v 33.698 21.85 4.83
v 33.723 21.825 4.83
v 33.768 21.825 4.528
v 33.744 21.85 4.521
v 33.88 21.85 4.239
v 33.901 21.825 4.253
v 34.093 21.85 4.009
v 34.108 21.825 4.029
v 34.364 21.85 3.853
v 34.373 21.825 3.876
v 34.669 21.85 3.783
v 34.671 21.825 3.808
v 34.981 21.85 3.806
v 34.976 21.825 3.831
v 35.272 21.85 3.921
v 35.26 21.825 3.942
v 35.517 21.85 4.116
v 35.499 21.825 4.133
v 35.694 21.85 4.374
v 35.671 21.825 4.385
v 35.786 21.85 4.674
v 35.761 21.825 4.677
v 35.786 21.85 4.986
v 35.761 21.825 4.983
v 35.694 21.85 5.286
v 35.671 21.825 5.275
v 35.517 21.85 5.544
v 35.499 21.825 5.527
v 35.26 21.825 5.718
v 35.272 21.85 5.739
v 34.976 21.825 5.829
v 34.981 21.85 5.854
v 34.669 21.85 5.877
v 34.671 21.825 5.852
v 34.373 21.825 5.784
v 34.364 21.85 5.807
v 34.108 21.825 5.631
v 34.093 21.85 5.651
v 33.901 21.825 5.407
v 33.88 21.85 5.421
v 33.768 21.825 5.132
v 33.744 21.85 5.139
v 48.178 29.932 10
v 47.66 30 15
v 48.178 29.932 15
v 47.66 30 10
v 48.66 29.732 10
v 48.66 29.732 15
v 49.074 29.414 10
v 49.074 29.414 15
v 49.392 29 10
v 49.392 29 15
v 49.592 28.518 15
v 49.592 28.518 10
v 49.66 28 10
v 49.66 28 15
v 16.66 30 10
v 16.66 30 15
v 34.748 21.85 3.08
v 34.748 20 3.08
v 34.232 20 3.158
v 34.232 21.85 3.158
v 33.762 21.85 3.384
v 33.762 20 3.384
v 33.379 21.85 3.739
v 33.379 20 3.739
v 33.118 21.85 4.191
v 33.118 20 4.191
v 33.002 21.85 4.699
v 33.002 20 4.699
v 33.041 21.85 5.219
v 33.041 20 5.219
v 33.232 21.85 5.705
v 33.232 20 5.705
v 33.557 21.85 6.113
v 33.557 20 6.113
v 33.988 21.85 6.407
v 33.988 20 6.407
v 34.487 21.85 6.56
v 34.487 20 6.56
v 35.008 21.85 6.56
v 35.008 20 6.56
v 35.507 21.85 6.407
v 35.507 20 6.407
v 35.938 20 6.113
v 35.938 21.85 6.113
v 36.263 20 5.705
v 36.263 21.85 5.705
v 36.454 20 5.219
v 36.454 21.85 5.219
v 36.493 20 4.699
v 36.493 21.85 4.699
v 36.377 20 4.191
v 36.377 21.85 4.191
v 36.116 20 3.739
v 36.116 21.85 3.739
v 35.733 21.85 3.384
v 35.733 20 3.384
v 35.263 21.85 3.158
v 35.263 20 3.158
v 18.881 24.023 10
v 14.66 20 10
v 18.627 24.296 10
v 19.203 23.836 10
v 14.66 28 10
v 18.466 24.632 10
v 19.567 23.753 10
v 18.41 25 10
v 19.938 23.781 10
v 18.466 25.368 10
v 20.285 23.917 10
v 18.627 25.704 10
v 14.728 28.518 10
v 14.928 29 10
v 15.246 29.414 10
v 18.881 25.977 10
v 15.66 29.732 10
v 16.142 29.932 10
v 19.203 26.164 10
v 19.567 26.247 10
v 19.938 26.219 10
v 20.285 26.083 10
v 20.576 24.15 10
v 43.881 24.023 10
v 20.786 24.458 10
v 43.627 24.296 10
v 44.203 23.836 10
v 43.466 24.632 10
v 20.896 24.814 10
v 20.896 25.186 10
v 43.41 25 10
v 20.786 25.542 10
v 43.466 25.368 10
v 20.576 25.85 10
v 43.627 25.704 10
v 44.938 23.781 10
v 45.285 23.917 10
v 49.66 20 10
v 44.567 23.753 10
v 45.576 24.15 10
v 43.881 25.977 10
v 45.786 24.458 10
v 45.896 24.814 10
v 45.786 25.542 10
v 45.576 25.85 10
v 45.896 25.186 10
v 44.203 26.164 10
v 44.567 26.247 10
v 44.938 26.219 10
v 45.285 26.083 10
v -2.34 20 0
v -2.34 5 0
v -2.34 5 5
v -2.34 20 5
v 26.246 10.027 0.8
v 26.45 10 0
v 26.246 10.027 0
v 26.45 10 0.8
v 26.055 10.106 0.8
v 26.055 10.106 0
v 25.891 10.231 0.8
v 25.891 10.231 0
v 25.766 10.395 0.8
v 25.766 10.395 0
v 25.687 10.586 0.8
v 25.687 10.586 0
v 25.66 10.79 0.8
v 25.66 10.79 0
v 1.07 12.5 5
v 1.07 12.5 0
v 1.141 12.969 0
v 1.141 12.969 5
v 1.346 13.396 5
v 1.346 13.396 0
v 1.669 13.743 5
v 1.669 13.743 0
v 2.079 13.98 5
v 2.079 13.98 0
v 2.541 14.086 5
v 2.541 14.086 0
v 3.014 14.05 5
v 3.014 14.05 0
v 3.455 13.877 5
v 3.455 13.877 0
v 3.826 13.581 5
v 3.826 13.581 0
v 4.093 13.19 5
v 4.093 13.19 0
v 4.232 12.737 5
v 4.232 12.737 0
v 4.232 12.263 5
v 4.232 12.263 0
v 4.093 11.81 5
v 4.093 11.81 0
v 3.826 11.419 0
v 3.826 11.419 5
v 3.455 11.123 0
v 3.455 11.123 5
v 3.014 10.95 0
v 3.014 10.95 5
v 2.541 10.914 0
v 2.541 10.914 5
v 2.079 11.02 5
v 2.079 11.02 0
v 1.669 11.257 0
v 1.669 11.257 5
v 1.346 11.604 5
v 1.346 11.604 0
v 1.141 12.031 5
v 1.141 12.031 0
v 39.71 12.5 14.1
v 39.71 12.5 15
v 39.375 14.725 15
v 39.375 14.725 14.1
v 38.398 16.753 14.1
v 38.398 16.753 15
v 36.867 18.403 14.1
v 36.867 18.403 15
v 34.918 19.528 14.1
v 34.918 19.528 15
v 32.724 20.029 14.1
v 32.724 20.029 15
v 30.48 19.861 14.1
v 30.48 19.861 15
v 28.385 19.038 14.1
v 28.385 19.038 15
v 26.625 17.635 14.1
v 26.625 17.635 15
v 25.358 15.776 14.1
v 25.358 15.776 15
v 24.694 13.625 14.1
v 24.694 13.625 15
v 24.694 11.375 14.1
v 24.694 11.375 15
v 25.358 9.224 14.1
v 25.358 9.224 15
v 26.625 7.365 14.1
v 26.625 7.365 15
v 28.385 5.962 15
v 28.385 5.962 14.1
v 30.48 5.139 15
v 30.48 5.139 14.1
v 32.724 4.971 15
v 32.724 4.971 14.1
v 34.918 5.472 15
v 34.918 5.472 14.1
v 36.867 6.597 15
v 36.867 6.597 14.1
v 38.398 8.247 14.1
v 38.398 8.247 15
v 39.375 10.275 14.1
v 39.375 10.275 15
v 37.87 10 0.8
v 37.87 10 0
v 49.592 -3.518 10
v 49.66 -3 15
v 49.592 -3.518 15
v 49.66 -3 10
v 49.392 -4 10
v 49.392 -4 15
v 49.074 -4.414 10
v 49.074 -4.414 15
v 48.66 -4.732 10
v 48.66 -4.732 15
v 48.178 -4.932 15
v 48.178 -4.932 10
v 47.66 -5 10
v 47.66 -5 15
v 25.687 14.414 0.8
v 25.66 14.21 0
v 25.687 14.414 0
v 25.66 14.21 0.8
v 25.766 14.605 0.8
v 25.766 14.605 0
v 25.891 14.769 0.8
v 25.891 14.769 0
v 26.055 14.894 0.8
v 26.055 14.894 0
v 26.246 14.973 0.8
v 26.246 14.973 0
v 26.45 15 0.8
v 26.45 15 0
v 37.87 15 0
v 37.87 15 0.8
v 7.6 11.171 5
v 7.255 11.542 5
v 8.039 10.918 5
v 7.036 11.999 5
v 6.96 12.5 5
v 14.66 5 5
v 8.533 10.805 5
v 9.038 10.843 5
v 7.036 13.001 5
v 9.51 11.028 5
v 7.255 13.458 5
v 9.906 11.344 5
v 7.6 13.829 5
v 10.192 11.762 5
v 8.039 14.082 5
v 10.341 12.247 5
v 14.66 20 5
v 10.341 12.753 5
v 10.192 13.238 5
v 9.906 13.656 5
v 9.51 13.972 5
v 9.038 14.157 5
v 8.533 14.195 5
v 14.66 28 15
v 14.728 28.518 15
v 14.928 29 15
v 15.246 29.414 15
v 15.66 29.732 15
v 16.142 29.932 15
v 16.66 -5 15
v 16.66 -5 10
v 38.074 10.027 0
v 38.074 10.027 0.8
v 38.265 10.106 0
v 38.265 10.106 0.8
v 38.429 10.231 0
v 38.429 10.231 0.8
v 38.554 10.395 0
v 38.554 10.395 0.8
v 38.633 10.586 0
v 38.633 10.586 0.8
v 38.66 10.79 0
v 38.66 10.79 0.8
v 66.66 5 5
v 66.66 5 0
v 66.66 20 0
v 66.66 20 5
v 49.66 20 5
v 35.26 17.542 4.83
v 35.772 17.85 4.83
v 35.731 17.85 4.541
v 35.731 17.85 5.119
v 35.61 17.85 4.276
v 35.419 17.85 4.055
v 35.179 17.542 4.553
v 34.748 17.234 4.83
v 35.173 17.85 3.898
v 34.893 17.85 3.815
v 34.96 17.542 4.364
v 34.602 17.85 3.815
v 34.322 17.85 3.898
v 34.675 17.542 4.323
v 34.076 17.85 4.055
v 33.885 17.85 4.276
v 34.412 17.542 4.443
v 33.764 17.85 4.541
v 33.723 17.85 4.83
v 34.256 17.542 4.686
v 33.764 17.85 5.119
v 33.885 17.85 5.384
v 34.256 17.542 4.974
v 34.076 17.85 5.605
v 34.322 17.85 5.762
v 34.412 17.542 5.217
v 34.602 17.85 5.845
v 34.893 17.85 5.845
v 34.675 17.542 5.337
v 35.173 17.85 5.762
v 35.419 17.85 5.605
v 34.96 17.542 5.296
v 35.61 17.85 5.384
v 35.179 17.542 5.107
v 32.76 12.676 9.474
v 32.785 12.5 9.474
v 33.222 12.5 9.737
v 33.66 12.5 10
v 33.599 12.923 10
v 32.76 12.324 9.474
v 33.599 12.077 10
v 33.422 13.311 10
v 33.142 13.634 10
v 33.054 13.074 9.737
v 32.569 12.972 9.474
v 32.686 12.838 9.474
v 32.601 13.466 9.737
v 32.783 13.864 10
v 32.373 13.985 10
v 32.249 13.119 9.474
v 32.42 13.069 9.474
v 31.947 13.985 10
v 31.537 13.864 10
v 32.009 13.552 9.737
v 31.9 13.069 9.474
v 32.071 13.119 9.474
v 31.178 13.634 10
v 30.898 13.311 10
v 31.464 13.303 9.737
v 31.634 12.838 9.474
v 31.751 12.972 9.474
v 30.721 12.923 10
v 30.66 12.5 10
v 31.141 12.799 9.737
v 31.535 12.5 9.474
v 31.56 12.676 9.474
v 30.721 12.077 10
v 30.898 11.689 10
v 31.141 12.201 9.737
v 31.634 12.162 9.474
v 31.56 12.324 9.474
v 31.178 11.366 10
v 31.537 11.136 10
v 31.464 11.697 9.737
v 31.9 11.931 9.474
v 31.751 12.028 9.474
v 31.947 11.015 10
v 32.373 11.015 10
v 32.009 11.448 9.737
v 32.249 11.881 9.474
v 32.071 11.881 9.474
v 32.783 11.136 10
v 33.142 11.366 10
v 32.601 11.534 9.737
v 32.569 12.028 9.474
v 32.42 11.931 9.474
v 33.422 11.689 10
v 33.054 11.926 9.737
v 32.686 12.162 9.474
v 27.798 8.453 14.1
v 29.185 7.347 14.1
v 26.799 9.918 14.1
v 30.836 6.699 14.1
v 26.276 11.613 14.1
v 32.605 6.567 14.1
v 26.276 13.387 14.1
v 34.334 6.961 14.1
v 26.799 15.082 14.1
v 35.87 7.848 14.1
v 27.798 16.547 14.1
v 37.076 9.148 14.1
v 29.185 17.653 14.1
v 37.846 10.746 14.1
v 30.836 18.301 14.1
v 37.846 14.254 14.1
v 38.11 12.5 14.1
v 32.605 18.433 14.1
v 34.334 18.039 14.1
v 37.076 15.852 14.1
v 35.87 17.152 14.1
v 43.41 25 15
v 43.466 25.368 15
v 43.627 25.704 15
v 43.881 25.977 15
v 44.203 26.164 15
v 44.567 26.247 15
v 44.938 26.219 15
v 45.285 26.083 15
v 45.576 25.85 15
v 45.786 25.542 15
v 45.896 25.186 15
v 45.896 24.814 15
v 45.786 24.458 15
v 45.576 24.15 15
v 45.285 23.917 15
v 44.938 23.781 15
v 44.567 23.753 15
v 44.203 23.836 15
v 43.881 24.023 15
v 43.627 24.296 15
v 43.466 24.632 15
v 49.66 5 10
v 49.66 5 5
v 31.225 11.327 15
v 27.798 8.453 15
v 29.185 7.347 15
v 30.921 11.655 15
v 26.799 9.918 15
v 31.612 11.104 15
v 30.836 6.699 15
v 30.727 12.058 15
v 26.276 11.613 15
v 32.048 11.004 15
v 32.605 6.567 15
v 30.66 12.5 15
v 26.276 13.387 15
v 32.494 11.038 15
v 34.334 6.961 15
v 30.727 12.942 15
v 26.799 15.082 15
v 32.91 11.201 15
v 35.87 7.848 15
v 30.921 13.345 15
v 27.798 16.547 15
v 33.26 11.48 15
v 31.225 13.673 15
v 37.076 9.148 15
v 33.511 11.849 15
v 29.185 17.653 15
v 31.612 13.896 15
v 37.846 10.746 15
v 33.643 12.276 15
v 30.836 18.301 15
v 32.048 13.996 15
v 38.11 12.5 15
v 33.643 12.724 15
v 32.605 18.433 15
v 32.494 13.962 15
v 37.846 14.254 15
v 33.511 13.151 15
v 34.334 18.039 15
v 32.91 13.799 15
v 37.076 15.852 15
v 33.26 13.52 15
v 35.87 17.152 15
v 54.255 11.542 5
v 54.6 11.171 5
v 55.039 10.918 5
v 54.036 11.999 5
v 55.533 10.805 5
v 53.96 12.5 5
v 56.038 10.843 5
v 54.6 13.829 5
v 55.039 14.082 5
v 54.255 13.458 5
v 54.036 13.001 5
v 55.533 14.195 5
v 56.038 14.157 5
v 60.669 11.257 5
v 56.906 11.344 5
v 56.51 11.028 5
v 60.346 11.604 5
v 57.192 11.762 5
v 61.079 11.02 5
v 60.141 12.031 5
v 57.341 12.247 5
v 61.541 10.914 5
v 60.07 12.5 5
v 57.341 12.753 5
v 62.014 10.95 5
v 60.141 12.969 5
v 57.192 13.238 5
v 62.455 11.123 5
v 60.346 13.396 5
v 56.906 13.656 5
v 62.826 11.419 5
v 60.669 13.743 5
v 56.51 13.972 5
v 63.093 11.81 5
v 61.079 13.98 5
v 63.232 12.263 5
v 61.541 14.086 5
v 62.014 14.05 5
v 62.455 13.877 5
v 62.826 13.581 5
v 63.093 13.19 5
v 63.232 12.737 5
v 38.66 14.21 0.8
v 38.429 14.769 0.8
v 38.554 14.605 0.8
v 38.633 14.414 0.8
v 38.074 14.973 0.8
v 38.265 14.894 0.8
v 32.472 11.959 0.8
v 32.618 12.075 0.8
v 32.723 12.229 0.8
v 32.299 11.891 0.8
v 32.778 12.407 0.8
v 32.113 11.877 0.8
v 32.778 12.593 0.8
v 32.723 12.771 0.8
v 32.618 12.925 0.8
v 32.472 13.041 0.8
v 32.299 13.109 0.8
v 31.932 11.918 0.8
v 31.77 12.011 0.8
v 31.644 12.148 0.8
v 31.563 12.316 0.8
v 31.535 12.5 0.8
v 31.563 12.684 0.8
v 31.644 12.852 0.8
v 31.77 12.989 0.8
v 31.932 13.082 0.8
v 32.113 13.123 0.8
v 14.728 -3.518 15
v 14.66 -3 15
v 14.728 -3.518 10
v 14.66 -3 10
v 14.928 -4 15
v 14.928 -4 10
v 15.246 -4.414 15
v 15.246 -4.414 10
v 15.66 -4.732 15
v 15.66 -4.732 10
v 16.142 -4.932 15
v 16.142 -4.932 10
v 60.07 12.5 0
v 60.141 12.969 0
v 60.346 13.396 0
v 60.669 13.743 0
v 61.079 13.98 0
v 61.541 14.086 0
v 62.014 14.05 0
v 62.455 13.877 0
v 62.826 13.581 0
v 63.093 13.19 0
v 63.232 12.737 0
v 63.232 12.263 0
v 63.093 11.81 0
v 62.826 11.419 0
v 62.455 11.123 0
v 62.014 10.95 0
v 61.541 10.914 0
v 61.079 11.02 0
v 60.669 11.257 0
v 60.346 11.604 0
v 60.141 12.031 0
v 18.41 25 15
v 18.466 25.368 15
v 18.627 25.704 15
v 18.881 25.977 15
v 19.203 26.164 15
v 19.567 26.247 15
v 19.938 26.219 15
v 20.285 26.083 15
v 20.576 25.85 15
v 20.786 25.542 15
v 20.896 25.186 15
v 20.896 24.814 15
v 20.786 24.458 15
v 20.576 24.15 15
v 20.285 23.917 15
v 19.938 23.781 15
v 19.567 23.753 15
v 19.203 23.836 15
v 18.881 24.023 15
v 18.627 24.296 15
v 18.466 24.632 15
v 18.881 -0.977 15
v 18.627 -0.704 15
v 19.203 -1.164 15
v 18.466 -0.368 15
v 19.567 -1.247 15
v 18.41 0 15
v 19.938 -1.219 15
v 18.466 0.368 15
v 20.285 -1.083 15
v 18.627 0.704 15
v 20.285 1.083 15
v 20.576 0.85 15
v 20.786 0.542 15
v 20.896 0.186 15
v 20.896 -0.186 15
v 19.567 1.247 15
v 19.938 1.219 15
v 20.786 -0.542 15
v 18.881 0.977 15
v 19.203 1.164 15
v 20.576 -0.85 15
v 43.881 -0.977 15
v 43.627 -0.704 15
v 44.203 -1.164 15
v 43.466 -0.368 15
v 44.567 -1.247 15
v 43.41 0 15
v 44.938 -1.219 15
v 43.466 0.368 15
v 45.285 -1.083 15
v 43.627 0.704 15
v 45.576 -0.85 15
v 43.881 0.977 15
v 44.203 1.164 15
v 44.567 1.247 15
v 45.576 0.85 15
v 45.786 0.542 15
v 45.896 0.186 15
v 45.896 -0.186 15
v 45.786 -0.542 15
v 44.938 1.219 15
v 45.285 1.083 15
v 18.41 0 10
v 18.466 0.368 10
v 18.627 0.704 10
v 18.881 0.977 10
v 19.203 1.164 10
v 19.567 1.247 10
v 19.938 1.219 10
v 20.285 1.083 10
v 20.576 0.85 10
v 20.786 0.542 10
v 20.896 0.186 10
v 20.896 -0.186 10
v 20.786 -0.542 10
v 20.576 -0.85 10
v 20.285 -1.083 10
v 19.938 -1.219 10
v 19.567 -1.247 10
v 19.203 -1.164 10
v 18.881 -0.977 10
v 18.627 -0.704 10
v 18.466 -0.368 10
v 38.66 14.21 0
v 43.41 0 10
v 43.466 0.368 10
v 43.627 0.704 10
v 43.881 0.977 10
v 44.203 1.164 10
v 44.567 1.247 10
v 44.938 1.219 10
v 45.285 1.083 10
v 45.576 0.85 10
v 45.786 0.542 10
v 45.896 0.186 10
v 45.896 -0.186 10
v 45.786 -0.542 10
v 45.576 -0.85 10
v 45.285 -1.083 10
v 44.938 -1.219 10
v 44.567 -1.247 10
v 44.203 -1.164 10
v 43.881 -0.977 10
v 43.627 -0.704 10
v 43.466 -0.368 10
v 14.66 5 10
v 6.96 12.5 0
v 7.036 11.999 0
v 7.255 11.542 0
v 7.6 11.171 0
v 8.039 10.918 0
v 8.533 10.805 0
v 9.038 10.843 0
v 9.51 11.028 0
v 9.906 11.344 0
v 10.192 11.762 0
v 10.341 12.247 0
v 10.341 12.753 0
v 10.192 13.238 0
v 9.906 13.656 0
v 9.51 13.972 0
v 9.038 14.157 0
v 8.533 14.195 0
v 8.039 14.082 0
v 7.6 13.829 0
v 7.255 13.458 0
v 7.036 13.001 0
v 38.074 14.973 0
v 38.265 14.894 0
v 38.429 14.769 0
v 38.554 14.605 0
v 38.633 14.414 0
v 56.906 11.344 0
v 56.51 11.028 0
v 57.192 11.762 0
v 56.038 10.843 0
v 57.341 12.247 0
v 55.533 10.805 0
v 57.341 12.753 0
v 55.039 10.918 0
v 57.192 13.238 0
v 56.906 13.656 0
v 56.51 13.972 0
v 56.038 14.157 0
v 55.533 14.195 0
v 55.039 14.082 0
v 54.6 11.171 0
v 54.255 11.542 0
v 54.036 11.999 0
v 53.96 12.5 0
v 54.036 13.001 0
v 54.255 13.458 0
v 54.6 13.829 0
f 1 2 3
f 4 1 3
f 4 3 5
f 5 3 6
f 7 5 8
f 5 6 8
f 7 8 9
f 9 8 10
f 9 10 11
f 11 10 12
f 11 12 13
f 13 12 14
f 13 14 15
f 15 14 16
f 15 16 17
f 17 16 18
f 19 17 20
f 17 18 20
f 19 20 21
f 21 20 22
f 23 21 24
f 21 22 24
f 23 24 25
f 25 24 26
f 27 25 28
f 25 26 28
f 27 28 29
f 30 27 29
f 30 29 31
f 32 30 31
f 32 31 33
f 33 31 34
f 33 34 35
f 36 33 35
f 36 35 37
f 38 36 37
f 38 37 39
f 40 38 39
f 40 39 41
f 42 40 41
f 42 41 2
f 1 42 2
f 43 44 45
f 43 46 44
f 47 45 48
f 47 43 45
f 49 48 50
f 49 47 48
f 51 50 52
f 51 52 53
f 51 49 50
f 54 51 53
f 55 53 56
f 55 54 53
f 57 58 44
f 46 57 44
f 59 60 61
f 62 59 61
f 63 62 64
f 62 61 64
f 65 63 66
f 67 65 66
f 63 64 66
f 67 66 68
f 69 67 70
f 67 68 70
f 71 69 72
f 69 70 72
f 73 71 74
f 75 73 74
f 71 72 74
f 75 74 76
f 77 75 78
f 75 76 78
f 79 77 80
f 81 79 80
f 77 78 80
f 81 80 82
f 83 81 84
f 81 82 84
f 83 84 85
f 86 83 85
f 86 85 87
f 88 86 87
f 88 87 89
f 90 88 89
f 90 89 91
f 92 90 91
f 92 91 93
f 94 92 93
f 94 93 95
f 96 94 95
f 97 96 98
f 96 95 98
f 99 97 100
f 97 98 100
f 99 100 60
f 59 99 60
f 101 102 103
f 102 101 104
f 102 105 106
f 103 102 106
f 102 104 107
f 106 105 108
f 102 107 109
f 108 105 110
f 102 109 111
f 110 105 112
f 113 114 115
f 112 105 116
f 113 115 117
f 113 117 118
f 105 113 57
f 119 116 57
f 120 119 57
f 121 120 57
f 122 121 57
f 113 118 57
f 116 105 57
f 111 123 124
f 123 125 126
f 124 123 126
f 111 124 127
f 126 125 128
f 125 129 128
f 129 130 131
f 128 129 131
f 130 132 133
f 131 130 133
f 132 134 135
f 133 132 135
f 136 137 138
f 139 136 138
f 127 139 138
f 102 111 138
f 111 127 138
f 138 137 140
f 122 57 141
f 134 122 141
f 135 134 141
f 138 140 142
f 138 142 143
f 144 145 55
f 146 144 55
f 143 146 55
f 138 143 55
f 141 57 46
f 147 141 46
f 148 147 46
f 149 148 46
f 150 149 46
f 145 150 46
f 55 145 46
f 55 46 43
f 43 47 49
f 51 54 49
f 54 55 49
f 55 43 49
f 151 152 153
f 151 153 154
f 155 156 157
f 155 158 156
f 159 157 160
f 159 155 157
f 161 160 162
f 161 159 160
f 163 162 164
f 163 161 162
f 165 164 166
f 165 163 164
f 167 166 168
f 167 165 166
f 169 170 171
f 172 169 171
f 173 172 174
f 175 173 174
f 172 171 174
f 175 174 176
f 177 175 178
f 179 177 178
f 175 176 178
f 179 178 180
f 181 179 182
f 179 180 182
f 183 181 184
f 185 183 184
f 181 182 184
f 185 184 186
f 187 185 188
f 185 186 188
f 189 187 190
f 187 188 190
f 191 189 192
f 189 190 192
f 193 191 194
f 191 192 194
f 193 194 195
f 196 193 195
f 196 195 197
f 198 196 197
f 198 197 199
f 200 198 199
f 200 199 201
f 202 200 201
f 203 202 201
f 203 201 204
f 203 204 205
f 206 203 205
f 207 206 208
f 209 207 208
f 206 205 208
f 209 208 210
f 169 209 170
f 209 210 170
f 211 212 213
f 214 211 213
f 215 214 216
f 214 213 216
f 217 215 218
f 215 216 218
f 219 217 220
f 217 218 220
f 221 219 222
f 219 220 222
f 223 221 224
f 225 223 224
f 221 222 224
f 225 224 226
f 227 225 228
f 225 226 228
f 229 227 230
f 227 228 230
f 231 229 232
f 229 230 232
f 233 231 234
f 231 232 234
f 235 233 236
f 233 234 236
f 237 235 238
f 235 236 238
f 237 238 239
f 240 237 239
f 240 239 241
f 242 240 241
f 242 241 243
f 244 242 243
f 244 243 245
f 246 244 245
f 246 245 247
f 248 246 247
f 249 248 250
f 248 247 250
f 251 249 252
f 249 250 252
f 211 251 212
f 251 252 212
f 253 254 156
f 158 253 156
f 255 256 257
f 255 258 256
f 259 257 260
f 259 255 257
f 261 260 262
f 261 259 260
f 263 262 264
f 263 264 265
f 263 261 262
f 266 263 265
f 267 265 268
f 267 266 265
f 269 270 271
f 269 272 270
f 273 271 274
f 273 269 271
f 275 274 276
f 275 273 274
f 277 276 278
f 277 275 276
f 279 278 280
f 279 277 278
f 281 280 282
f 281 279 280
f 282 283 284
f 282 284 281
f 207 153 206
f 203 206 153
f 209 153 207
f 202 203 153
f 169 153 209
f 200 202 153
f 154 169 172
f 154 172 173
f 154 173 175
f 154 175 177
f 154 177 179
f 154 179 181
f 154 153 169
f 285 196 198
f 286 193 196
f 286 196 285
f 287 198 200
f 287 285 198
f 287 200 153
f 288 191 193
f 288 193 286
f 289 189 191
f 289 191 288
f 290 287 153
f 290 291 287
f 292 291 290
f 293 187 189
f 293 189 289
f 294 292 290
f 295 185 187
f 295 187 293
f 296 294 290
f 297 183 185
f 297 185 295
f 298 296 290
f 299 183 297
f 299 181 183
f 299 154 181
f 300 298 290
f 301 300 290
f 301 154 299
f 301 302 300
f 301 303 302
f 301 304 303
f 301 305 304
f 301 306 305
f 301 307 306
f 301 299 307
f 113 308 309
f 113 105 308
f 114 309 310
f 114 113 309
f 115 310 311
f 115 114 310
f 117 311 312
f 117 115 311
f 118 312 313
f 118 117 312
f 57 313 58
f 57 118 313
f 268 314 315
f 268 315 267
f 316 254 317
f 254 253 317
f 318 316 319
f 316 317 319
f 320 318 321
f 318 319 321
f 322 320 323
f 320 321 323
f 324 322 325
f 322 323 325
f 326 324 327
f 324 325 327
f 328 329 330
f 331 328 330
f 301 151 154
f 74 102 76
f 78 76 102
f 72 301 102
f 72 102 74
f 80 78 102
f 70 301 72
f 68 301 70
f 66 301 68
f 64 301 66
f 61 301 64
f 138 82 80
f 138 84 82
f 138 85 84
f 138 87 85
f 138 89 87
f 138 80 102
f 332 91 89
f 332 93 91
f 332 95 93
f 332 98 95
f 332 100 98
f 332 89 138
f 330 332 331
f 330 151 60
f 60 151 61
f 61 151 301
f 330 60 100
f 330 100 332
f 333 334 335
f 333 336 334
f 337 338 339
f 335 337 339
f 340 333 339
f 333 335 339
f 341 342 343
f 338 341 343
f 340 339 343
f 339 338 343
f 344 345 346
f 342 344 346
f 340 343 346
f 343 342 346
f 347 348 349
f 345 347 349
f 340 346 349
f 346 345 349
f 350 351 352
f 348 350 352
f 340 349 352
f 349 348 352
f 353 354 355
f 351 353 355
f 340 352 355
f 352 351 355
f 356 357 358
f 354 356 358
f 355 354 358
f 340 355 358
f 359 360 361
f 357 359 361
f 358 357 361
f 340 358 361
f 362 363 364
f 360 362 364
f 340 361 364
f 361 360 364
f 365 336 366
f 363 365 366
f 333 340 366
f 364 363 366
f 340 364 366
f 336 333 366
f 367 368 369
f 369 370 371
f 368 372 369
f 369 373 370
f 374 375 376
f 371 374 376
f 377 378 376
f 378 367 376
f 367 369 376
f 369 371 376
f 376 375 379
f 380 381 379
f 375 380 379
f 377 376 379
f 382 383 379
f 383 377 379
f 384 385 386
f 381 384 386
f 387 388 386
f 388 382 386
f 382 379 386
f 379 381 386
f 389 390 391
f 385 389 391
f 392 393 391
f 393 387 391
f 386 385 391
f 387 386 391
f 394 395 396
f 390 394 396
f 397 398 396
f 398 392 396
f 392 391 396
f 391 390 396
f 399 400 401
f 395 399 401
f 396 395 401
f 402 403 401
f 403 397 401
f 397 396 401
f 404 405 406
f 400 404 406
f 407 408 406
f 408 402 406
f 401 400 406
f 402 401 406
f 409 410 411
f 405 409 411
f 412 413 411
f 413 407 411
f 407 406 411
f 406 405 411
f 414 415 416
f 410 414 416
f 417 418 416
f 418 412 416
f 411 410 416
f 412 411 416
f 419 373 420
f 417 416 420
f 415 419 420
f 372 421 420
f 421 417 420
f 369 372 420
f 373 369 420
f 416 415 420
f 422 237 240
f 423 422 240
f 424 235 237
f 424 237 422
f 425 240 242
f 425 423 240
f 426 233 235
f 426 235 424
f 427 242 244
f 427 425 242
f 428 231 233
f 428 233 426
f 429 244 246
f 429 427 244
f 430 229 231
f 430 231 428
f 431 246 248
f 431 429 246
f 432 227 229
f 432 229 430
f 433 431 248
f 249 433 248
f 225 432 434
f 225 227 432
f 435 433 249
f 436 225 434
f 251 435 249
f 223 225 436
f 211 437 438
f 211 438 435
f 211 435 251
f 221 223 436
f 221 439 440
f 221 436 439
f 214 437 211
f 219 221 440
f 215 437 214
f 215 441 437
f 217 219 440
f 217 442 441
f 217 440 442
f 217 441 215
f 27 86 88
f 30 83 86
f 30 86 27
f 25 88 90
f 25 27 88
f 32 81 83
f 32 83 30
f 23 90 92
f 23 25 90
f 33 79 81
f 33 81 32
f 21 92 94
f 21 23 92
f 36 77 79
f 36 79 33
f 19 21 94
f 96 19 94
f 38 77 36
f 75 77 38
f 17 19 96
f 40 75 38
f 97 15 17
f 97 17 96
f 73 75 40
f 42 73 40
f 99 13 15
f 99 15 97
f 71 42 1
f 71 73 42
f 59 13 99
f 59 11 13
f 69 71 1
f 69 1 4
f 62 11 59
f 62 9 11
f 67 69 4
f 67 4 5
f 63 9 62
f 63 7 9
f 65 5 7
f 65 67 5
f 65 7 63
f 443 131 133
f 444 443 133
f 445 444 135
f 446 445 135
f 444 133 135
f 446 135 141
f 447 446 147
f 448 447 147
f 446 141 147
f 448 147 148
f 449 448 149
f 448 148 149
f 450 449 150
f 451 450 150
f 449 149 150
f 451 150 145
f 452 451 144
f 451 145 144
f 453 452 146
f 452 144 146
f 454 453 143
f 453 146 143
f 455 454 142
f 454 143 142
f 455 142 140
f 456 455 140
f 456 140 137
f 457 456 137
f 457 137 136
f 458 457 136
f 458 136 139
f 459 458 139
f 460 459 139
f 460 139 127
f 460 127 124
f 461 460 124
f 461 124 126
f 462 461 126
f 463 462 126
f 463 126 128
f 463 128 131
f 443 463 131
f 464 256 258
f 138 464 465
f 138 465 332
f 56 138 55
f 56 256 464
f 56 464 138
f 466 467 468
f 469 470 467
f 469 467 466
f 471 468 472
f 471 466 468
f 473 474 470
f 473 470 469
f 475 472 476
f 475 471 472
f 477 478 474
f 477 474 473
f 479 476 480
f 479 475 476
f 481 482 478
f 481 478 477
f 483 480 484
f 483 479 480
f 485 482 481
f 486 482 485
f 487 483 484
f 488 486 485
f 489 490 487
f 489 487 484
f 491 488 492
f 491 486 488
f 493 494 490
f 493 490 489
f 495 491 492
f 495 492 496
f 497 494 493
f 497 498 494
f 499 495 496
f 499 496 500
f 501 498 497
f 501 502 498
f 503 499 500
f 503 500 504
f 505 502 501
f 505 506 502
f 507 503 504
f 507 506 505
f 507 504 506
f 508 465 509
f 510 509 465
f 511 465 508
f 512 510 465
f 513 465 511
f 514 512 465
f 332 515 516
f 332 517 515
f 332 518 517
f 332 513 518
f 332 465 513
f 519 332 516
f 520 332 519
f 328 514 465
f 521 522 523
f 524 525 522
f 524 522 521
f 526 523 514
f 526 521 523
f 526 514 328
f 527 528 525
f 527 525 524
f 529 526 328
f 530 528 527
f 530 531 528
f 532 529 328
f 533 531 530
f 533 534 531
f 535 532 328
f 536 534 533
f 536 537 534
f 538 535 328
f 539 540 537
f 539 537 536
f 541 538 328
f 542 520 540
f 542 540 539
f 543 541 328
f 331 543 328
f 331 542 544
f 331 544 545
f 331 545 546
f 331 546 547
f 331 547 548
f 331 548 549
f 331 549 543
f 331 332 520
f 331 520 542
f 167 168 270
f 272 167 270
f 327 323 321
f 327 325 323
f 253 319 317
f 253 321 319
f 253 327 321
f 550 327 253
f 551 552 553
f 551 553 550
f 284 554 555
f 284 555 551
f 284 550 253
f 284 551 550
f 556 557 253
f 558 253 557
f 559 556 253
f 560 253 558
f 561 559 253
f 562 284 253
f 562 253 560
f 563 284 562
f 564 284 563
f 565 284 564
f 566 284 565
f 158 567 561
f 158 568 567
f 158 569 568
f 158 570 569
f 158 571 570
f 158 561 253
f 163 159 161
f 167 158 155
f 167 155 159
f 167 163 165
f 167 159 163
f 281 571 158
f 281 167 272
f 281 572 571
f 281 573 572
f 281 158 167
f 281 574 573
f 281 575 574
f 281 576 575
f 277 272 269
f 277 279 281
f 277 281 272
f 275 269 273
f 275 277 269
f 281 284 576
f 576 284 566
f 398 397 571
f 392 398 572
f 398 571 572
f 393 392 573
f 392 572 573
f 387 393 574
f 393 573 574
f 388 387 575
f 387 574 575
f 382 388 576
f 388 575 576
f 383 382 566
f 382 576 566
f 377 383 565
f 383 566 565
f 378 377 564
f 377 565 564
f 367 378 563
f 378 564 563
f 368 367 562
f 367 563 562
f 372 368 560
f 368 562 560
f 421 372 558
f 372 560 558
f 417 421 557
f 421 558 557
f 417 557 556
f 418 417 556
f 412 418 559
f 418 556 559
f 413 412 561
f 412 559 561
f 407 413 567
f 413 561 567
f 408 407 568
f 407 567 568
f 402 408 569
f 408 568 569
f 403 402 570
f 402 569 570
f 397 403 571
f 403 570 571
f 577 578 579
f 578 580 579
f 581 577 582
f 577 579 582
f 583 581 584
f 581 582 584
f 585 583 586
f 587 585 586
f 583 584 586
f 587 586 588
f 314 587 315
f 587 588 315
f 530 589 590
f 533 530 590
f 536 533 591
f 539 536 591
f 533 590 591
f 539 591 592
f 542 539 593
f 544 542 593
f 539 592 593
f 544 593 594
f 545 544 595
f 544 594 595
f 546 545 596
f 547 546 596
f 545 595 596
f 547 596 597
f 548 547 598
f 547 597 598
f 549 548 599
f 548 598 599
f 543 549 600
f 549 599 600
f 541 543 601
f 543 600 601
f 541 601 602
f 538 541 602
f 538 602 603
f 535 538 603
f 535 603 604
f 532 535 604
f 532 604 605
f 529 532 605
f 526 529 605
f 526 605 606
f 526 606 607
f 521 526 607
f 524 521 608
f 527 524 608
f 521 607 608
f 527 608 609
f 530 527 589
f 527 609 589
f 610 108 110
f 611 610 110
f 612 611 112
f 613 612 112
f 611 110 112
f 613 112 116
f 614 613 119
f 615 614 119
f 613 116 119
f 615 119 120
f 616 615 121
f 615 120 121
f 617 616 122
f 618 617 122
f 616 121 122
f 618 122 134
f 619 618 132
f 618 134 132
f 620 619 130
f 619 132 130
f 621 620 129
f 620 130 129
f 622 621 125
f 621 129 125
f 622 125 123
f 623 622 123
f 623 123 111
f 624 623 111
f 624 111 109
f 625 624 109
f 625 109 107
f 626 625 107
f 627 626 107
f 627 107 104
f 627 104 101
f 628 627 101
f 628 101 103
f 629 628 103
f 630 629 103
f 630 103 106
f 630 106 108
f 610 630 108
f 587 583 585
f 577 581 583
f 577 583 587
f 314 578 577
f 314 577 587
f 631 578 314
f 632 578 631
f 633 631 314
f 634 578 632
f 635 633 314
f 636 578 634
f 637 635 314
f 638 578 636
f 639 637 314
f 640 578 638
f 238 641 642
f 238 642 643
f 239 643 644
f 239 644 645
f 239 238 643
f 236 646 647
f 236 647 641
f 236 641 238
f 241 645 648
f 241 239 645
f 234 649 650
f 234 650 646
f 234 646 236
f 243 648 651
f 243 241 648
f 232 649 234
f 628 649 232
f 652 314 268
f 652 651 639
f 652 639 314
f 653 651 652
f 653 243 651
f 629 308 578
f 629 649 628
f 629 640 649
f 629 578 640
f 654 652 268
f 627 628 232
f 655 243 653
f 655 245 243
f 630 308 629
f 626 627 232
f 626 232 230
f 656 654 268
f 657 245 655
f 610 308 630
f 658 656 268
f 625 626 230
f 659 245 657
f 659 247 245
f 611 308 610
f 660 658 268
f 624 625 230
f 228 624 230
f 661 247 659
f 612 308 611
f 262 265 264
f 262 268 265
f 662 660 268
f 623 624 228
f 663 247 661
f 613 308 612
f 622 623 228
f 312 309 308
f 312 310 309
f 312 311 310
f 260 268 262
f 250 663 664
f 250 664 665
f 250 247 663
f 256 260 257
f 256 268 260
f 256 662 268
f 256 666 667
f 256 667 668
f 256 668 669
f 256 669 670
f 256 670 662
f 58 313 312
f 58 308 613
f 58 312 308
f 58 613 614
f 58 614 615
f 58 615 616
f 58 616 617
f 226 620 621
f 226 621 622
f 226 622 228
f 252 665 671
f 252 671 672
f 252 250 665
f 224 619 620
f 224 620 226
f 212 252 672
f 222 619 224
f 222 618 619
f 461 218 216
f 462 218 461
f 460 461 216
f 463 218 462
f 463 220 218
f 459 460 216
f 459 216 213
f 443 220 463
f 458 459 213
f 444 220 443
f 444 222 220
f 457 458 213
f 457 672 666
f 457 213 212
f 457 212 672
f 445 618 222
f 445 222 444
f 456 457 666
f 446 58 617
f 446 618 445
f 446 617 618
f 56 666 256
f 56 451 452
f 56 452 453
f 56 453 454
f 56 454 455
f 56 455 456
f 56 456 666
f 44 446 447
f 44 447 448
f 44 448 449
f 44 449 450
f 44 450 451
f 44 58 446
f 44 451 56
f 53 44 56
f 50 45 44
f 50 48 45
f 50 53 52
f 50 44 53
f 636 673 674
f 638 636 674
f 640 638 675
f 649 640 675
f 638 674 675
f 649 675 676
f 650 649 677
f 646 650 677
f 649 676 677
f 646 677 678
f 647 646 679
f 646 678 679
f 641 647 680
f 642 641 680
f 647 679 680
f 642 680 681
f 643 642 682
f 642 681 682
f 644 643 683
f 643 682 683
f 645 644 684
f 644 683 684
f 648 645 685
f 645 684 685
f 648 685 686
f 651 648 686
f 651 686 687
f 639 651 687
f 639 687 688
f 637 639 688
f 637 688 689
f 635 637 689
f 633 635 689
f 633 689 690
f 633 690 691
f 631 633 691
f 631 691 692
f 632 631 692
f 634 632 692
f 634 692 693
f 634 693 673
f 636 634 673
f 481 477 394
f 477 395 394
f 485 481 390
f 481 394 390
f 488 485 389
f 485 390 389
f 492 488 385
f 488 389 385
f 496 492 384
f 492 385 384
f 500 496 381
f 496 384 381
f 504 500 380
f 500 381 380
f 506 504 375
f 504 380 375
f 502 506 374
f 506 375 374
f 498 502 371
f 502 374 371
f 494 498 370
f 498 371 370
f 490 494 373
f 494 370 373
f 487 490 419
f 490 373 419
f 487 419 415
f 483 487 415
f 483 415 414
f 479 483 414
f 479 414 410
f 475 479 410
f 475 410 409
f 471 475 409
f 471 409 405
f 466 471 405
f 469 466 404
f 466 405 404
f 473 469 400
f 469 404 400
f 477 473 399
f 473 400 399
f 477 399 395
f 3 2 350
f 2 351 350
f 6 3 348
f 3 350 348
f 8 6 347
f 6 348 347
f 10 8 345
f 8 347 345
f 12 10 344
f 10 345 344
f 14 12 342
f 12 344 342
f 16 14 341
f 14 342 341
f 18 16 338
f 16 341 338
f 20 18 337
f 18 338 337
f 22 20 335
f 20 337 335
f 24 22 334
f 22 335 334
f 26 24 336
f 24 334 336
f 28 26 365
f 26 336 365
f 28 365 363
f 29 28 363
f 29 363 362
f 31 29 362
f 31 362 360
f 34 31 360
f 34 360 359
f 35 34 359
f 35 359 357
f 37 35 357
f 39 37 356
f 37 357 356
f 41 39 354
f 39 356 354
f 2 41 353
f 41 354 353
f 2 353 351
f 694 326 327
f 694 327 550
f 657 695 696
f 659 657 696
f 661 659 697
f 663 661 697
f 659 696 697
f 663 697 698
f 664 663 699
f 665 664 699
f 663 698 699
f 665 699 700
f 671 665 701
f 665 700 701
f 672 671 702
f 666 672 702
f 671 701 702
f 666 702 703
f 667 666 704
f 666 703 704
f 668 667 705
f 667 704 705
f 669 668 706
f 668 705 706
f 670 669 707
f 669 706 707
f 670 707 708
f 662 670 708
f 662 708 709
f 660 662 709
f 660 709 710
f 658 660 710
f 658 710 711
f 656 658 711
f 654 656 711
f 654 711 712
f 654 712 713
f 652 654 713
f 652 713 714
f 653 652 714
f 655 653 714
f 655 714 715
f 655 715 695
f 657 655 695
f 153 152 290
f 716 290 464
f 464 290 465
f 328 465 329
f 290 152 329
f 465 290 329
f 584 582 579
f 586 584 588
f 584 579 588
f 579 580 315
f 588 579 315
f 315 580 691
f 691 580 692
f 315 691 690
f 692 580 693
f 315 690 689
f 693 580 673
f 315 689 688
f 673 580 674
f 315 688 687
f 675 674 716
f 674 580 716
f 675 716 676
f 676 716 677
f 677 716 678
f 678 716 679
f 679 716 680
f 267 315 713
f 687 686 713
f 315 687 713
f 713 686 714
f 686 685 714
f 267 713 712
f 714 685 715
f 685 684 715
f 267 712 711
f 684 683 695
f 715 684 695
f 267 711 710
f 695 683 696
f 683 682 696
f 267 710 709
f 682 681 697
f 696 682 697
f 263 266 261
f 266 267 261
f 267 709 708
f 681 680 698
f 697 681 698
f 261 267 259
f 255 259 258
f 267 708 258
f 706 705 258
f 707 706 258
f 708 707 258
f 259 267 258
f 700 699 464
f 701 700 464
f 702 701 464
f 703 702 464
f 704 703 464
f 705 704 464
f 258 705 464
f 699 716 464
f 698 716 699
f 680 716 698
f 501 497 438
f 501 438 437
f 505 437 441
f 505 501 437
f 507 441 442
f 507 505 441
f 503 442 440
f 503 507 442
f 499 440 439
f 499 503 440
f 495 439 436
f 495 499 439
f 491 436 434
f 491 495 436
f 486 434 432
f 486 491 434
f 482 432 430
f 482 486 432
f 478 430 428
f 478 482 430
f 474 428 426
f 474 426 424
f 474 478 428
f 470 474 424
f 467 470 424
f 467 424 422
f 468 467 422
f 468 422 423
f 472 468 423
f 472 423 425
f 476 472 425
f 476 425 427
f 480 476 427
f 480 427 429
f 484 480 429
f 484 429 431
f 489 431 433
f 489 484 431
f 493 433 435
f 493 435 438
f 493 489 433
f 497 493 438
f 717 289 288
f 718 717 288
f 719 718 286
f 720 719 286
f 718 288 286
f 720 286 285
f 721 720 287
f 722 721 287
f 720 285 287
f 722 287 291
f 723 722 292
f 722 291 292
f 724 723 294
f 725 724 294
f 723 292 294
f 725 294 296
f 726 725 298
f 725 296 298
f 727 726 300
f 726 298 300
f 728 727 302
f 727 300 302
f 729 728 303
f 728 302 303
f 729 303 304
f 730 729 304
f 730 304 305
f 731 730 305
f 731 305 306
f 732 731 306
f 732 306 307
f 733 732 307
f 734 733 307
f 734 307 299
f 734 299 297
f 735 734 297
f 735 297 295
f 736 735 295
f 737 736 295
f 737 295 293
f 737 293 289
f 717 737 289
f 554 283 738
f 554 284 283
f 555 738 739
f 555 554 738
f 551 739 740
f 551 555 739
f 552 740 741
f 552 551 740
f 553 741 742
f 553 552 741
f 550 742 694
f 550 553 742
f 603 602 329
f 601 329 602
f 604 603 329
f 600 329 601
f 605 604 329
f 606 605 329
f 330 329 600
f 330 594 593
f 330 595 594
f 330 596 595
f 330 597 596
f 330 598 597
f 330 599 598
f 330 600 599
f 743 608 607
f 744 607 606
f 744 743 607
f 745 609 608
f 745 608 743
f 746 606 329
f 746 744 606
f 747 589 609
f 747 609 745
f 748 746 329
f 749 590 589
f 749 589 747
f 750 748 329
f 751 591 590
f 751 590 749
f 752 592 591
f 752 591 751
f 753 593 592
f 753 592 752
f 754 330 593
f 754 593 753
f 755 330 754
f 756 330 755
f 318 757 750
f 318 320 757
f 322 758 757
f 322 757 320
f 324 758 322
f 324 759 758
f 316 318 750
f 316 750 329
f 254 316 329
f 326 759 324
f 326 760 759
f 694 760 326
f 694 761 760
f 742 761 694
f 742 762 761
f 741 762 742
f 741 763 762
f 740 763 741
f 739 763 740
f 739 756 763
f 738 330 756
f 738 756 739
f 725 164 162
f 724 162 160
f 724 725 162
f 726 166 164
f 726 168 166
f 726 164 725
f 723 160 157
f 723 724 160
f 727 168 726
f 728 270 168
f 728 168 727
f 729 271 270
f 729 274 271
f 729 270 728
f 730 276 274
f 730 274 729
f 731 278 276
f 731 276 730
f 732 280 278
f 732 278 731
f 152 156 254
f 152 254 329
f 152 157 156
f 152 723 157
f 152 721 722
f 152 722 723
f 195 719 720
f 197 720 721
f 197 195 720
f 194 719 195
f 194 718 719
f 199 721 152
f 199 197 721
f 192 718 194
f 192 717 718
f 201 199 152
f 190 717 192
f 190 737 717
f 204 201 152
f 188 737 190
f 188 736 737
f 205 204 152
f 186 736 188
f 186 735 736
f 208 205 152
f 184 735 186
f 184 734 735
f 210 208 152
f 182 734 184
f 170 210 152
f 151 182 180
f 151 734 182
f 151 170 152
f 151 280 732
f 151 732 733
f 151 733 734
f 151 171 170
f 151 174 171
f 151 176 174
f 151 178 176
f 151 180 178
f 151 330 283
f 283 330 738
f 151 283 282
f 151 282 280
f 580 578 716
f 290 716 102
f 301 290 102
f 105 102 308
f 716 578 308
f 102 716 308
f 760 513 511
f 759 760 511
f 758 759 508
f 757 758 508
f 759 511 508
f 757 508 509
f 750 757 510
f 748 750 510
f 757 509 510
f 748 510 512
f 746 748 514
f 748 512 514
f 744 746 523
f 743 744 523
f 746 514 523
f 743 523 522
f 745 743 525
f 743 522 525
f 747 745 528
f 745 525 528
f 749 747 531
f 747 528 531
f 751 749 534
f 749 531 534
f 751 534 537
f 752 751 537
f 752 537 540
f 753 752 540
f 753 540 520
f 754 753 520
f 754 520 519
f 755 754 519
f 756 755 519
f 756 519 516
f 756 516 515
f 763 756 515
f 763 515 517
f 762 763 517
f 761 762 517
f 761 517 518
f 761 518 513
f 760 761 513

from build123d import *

# Parameters (mm, degrees)
SKETCH1_W                                = 60
SKETCH1_H                                = 20
BOSS_EXTRUDE1_DEPTH                      = 37
CUT_EXTRUDE2_DEPTH                       = 74.273460407
CUT_EXTRUDE2_DEPTH_BACK                  = 74.273460407
SKETCH7_W                                = 60
SKETCH7_H                                = 5
SKETCH16_R                               = 1.75
BOSS_EXTRUDE3_DEPTH                      = 1.85
SKETCH27_W                               = 0.34
SKETCH27_H                               = 37
SKETCH27_W_2                             = 4.66
CUT_EXTRUDE9_DEPTH                       = 73.069410987
SKETCH28_W                               = 8.45
SKETCH28_H                               = 32
CUT_EXTRUDE10_DEPTH                      = 72.786597635
CUT_EXTRUDE13_DEPTH                      = 72.786597635
CUT_EXTRUDE13_DEPTH_BACK                 = 72.786597635
SKETCH35_OUTSIDE_W                       = 70.68
SKETCH35_OUTSIDE_H                       = 52.68
SKETCH35_OUTSIDE_W_2                     = 38.1
SKETCH35_OUTSIDE_H_2                     = 20
CUT_EXTRUDE14_DEPTH                      = 65.934306033
CUT_EXTRUDE14_DEPTH_BACK                 = 65.934306033
SKETCH39_W                               = 7
SKETCH39_H                               = 10
M3_CLEARANCE_HOLE2_D                     = 3.4
TAP_DRILL_FOR_10_32_TAP1_D               = 4.0386
TAP_DRILL_FOR_10_32_TAP1_DEPTH           = 5
TAP_DRILL_FOR_10_32_TAP1_TIP             = 1.213317848
SKETCH6_R                                = 0.625
CUT_EXTRUDE1_DEPTH                       = 27
SKETCH44_W                               = 0.62
SKETCH44_H                               = 12.45
SKETCH48_R                               = 1.58
CUT_EXTRUDE17_DEPTH                      = 8
SKETCH49_R                               = 1.709194905
SKETCH49_R_2                             = 1.7
SKETCH49_R_3                             = 1.58
BOSS_EXTRUDE4_DEPTH                      = 10
BOSS_EXTRUDE5_START                      = 17
SKETCH50_W                               = 38.1
SKETCH50_H                               = 15
SKETCH50_R                               = 0.625
BOSS_EXTRUDE5_DEPTH                      = 17
SKETCH53_W                               = 15.45
SKETCH53_H                               = 15
BOSS_EXTRUDE6_DEPTH                      = 5
SKETCH54_R                               = 1.75
BOSS_EXTRUDE7_DEPTH                      = 1.85
TAP_DRILL_FOR_M2_5X0_45_TAP2_D           = 2.05
TAP_DRILL_FOR_M2_5X0_45_TAP2_DEPTH       = 4
TAP_DRILL_FOR_M2_5X0_45_TAP2_CSINK_D     = 2.1
TAP_DRILL_FOR_M2_5X0_45_TAP2_CSINK_ANGLE = 90
TAP_DRILL_FOR_M2_5X0_45_TAP2_TIP         = 0.615882135
M3_CLEARANCE_HOLE1_D                     = 3.4
SKETCH56_R                               = 1.59
CUT_EXTRUDE21_DEPTH                      = 5
SKETCH57_W                               = 13
SKETCH57_H                               = 5
CUT_EXTRUDE22_DEPTH                      = 0.8
FILLET1_R                                = 0.79
SKETCH58_W                               = 7
SKETCH58_H                               = 10
BOSS_EXTRUDE8_DEPTH                      = 15
TAP_DRILL_FOR_M3X0_5_TAP1_D              = 2.5
SKETCH59_W                               = 38.1
SKETCH59_H                               = 22
CUT_EXTRUDE23_DEPTH                      = 78.701709119
F_3_0MM_DOWEL_HOLE1_D                    = 3
F_3_0MM_DOWEL_HOLE1_DEPTH                = 5
F_3_0MM_DOWEL_HOLE1_TIP                  = 0.901290929
SKETCH65_W                               = 35
SKETCH65_H                               = 35
SKETCH65_R                               = 1
SKETCH65_R_2                             = 4
BOSS_EXTRUDE9_DEPTH                      = 5
SKETCH64_R                               = 7.55
SKETCH64_R_2                             = 5.95
CUT_EXTRUDE24_DEPTH                      = 0.9
TAP_DRILL_FOR_M3X0_5_TAP2_D              = 2.5
SKETCH68_W                               = 1.55
SKETCH68_H                               = 10
CUT_EXTRUDE25_DEPTH                      = 73.756825109
FILLET2_R                                = 2


with BuildPart() as part:
    # Sketch1 → Boss-Extrude1 (new body)
    with BuildSketch(Plane.XY):
        with Locations((30, 10)):
            Rectangle(SKETCH1_W, SKETCH1_H)
    extrude(amount=BOSS_EXTRUDE1_DEPTH)

    # Sketch7 → Cut-Extrude2 (cut, two sides: drawn at the far end of the back side and taken through both)
    with BuildSketch(Plane(origin=(0, 0, 0), x_dir=(-1, 0, 0), z_dir=(0, 0, -1)).offset(-CUT_EXTRUDE2_DEPTH_BACK)):
        with Locations((-30, 2.5)):
            Rectangle(SKETCH7_W, SKETCH7_H)
    extrude(amount=CUT_EXTRUDE2_DEPTH + CUT_EXTRUDE2_DEPTH_BACK, mode=Mode.SUBTRACT)

    # Sketch16 → Boss-Extrude3 (add)
    with BuildSketch(Plane(origin=(0, 20, 0), x_dir=(1, 0, 0), z_dir=(0, 1, 0))):
        with Locations(Location((34.7475, -4.83, 0), (0, 0, 90))):
            Circle(SKETCH16_R)
    extrude(amount=BOSS_EXTRUDE3_DEPTH)

    # Sketch27 → Cut-Extrude9 (cut, through all)
    with BuildSketch(Plane(origin=(0, 20, 0), x_dir=(1, 0, 0), z_dir=(0, 1, 0))):
        with Locations((59.83, -18.5)):
            Rectangle(SKETCH27_W, SKETCH27_H)
        with Locations((2.33, -18.5)):
            Rectangle(SKETCH27_W_2, SKETCH27_H)
    extrude(amount=-CUT_EXTRUDE9_DEPTH, mode=Mode.SUBTRACT)

    # Sketch28 → Cut-Extrude10 (cut, through all)
    with BuildSketch(Plane(origin=(0, 20, 0), x_dir=(1, 0, 0), z_dir=(0, 1, 0))):
        with Locations((55.435, -21)):
            Rectangle(SKETCH28_W, SKETCH28_H)
        with Locations((8.885, -21)):
            Rectangle(SKETCH28_W, SKETCH28_H)
    extrude(amount=-CUT_EXTRUDE10_DEPTH, mode=Mode.SUBTRACT)

    # Sketch35 outside → Cut-Extrude13 (cut, two sides: drawn at the far end of the back side and taken through both)
    with BuildSketch(Plane(origin=(0, 20, 0), x_dir=(1, 0, 0), z_dir=(0, 1, 0)).offset(-CUT_EXTRUDE13_DEPTH_BACK)):
        with Locations((32.16, -18.5)):
            Rectangle(SKETCH35_OUTSIDE_W, SKETCH35_OUTSIDE_H)
        with Locations((32.16, -27)):
            Rectangle(SKETCH35_OUTSIDE_W_2, SKETCH35_OUTSIDE_H_2, mode=Mode.SUBTRACT)
    extrude(amount=CUT_EXTRUDE13_DEPTH + CUT_EXTRUDE13_DEPTH_BACK, mode=Mode.SUBTRACT)

    # Sketch39 → Cut-Extrude14 (cut, two sides: drawn at the far end of the back side and taken through both)
    with BuildSketch(Plane(origin=(0, 20, 0), x_dir=(1, 0, 0), z_dir=(0, 1, 0)).offset(-CUT_EXTRUDE14_DEPTH_BACK)):
        with Locations((16.61, -32)):
            Rectangle(SKETCH39_W, SKETCH39_H)
        with Locations((47.71, -32)):
            Rectangle(SKETCH39_W, SKETCH39_H)
    extrude(amount=CUT_EXTRUDE14_DEPTH + CUT_EXTRUDE14_DEPTH_BACK, mode=Mode.SUBTRACT)

    # M3 Clearance Hole2 (through all)
    with Locations(Plane.XY.offset(27)):
        with Locations((17.11, 12.5), (47.21, 12.5)):
            Hole(M3_CLEARANCE_HOLE2_D / 2)

    # Tap Drill for #10-32 Tap1
    with Locations(Plane.XY.offset(37)):
        with Locations((32.16, 12.5)):
            Hole(TAP_DRILL_FOR_10_32_TAP1_D / 2, depth=TAP_DRILL_FOR_10_32_TAP1_DEPTH)
            with Locations((0, 0, -(TAP_DRILL_FOR_10_32_TAP1_DEPTH + TAP_DRILL_FOR_10_32_TAP1_TIP / 2))):  # 118° drill point
                Cone(0, TAP_DRILL_FOR_10_32_TAP1_D / 2, TAP_DRILL_FOR_10_32_TAP1_TIP, mode=Mode.SUBTRACT)

    # Sketch6 → Cut-Extrude1 (cut)
    with BuildSketch(Plane(origin=(0, 0, 17), x_dir=(-1, 0, 0), z_dir=(0, 0, -1))):
        with Locations((-32.16, 12.5)):
            Circle(SKETCH6_R)
    extrude(amount=-CUT_EXTRUDE1_DEPTH, mode=Mode.SUBTRACT)

    # Sketch44 → Cut-Revolve1 (revolve, cut)
    with BuildSketch(Plane(origin=(0, 12.5, 0), x_dir=(1, 0, 0), z_dir=(0, 1, 0))):
        Polygon((34.18, -37), (32.16, -37), (32.16, -29.45), (32.78, -29.45), (34.18, -30.29), align=None)
        with Locations((32.47, -23.225)):
            Rectangle(SKETCH44_W, SKETCH44_H)
    revolve(axis=Axis((32.16, 12.5, 37), (0, 0, -1)), mode=Mode.SUBTRACT)

    # Sketch48 → Cut-Extrude17 (cut)
    with BuildSketch(Plane(origin=(0, 0, 17), x_dir=(-1, 0, 0), z_dir=(0, 0, -1))):
        with Locations((-37.21, 15)):
            Circle(SKETCH48_R)
        with Locations((-27.11, 15)):
            Circle(SKETCH48_R)
    extrude(amount=-CUT_EXTRUDE17_DEPTH, mode=Mode.SUBTRACT)

    # Sketch49 → Boss-Extrude4 (add)
    with BuildSketch(Plane(origin=(0, 0, 17), x_dir=(-1, 0, 0), z_dir=(0, 0, -1))):
        with Locations((-47.21, 12.5)):
            Circle(SKETCH49_R)
        with Locations((-17.11, 12.5)):
            Circle(SKETCH49_R_2)
        with Locations((-27.11, 15)):
            Circle(SKETCH49_R_3)
        with Locations((-37.21, 15)):
            Circle(SKETCH49_R_3)
    extrude(amount=-BOSS_EXTRUDE4_DEPTH)

    # Sketch50 → Boss-Extrude5 (add)
    with BuildSketch(Plane(origin=(0, 0, 17), x_dir=(-1, 0, 0), z_dir=(0, 0, -1)).offset(BOSS_EXTRUDE5_START)):
        with Locations((-32.16, 12.5)):
            Rectangle(SKETCH50_W, SKETCH50_H)
        with Locations((-32.16, 12.5)):
            Circle(SKETCH50_R, mode=Mode.SUBTRACT)
    extrude(amount=-BOSS_EXTRUDE5_DEPTH)

    # Sketch53 → Boss-Extrude6 (add)
    with BuildSketch(Plane(origin=(0, 0, 0), x_dir=(-1, 0, 0), z_dir=(0, 0, -1))):
        with Locations((-5.385, 12.5)):
            Rectangle(SKETCH53_W, SKETCH53_H)
        with Locations((-58.935, 12.5)):
            Rectangle(SKETCH53_W, SKETCH53_H)
    extrude(amount=-BOSS_EXTRUDE6_DEPTH)

    # Sketch54 → Boss-Extrude7 (add)
    with BuildSketch(Plane(origin=(0, 20, 0), x_dir=(1, 0, 0), z_dir=(0, 1, 0))):
        with Locations(Location((34.7475, -4.83, 0), (0, 0, 90))):
            Circle(SKETCH54_R)
    extrude(amount=BOSS_EXTRUDE7_DEPTH)

    # Tap Drill for M2.5x0.45 Tap2
    with Locations(Plane(origin=(0, 21.85, 0), x_dir=(1, 0, 0), z_dir=(0, 1, 0))):
        with Locations((34.7475, -4.83)):
            CounterSinkHole(TAP_DRILL_FOR_M2_5X0_45_TAP2_D / 2, TAP_DRILL_FOR_M2_5X0_45_TAP2_CSINK_D / 2, depth=TAP_DRILL_FOR_M2_5X0_45_TAP2_DEPTH, counter_sink_angle=TAP_DRILL_FOR_M2_5X0_45_TAP2_CSINK_ANGLE)
            with Locations((0, 0, -(TAP_DRILL_FOR_M2_5X0_45_TAP2_DEPTH + TAP_DRILL_FOR_M2_5X0_45_TAP2_TIP / 2))):  # 118° drill point
                Cone(0, TAP_DRILL_FOR_M2_5X0_45_TAP2_D / 2, TAP_DRILL_FOR_M2_5X0_45_TAP2_TIP, mode=Mode.SUBTRACT)

    # M3 Clearance Hole1 (through all)
    with Locations(Plane(origin=(0, 0, 0), x_dir=(1, 0, 0), z_dir=(0, 0, -1))):
        with Locations((8.66, -12.5), (55.66, -12.5)):
            Hole(M3_CLEARANCE_HOLE1_D / 2)

    # Sketch56 → Cut-Extrude21 (cut)
    with BuildSketch(Plane(origin=(0, 0, 0), x_dir=(-1, 0, 0), z_dir=(0, 0, -1))):
        with Locations((-61.66, 12.5)):
            Circle(SKETCH56_R)
        with Locations((-2.66, 12.5)):
            Circle(SKETCH56_R)
    extrude(amount=-CUT_EXTRUDE21_DEPTH, mode=Mode.SUBTRACT)

    # Sketch57 → Cut-Extrude22 (cut)
    with BuildSketch(Plane(origin=(0, 0, 0), x_dir=(-1, 0, 0), z_dir=(0, 0, -1))):
        with Locations((-32.16, 12.5)):
            Rectangle(SKETCH57_W, SKETCH57_H)
    extrude(amount=-CUT_EXTRUDE22_DEPTH, mode=Mode.SUBTRACT)

    # Fillet1
    fillet1_edges = [part.edges().sort_by_distance(p)[0] for p in [
        (38.66, 10, 0.4),
        (38.66, 15, 0.4),
        (25.66, 15, 0.4),
        (25.66, 10, 0.4),
    ]]
    fillet(fillet1_edges, radius=FILLET1_R)

    # Sketch58 → Boss-Extrude8 (add)
    with BuildSketch(Plane(origin=(0, 20, 0), x_dir=(1, 0, 0), z_dir=(0, 1, 0))):
        with Locations((16.61, -32)):
            Rectangle(SKETCH58_W, SKETCH58_H)
        with Locations((47.71, -32)):
            Rectangle(SKETCH58_W, SKETCH58_H)
    extrude(amount=-BOSS_EXTRUDE8_DEPTH)

    # Tap Drill for M3x0.5 Tap1 (through all)
    with Locations(Plane(origin=(0, 5, 0), x_dir=(-1, 0, 0), z_dir=(0, -1, 0))):
        with Locations((-16.61, -33.5), (-47.71, -33.5)):
            Hole(TAP_DRILL_FOR_M3X0_5_TAP1_D / 2)

    # Sketch59 → Cut-Extrude23 (cut, through all)
    with BuildSketch(Plane(origin=(0, 20, 0), x_dir=(1, 0, 0), z_dir=(0, 1, 0))):
        with Locations((32.16, -26)):
            Rectangle(SKETCH59_W, SKETCH59_H)
    extrude(amount=-CUT_EXTRUDE23_DEPTH, mode=Mode.SUBTRACT)

    # Ø3.0mm Dowel Hole1
    with Locations(Plane.XY.offset(15)):
        with Locations((32.16, 12.5)):
            Hole(F_3_0MM_DOWEL_HOLE1_D / 2, depth=F_3_0MM_DOWEL_HOLE1_DEPTH)
            with Locations((0, 0, -(F_3_0MM_DOWEL_HOLE1_DEPTH + F_3_0MM_DOWEL_HOLE1_TIP / 2))):  # 118° drill point
                Cone(0, F_3_0MM_DOWEL_HOLE1_D / 2, F_3_0MM_DOWEL_HOLE1_TIP, mode=Mode.SUBTRACT)

    # Sketch65 → Boss-Extrude9 (add)
    with BuildSketch(Plane.XY.offset(15)):
        with Locations((32.16, 12.5)):
            Rectangle(SKETCH65_W, SKETCH65_H)
        with Locations((19.66, 25)):
            Circle(SKETCH65_R, mode=Mode.SUBTRACT)
        with Locations((44.66, 25)):
            Circle(SKETCH65_R, mode=Mode.SUBTRACT)
        with Locations((44.66, 0)):
            Circle(SKETCH65_R, mode=Mode.SUBTRACT)
        with Locations((19.66, 0)):
            Circle(SKETCH65_R, mode=Mode.SUBTRACT)
        with Locations((32.16, 12.5)):
            Circle(SKETCH65_R_2, mode=Mode.SUBTRACT)
    extrude(amount=-BOSS_EXTRUDE9_DEPTH)

    # Sketch64 → Cut-Extrude24 (cut)
    with BuildSketch(Plane.XY.offset(15)):
        with Locations((32.16, 12.5)):
            Circle(SKETCH64_R)
        with Locations((32.16, 12.5)):
            Circle(SKETCH64_R_2, mode=Mode.SUBTRACT)
    extrude(amount=-CUT_EXTRUDE24_DEPTH, mode=Mode.SUBTRACT)

    # Tap Drill for M3x0.5 Tap2 (through all)
    with Locations(Plane.XY.offset(15)):
        with Locations((19.66, 0), (19.66, 25), (44.66, 25), (44.66, 0)):
            Hole(TAP_DRILL_FOR_M3X0_5_TAP2_D / 2)

    # Sketch68 → Cut-Extrude25 (cut, through all)
    with BuildSketch(Plane(origin=(0, 20, 0), x_dir=(1, 0, 0), z_dir=(0, 1, 0))):
        with Locations((13.885, -10)):
            Rectangle(SKETCH68_W, SKETCH68_H)
        with Locations((50.435, -10)):
            Rectangle(SKETCH68_W, SKETCH68_H)
    extrude(amount=-CUT_EXTRUDE25_DEPTH, mode=Mode.SUBTRACT)

    # Fillet2
    fillet2_edges = [part.edges().sort_by_distance(p)[0] for p in [
        (14.66, -5, 12.5),
        (49.66, 30, 12.5),
        (14.66, 30, 12.5),
        (49.66, -5, 12.5),
    ]]
    fillet(fillet2_edges, radius=FILLET2_R)


solid = part.part
